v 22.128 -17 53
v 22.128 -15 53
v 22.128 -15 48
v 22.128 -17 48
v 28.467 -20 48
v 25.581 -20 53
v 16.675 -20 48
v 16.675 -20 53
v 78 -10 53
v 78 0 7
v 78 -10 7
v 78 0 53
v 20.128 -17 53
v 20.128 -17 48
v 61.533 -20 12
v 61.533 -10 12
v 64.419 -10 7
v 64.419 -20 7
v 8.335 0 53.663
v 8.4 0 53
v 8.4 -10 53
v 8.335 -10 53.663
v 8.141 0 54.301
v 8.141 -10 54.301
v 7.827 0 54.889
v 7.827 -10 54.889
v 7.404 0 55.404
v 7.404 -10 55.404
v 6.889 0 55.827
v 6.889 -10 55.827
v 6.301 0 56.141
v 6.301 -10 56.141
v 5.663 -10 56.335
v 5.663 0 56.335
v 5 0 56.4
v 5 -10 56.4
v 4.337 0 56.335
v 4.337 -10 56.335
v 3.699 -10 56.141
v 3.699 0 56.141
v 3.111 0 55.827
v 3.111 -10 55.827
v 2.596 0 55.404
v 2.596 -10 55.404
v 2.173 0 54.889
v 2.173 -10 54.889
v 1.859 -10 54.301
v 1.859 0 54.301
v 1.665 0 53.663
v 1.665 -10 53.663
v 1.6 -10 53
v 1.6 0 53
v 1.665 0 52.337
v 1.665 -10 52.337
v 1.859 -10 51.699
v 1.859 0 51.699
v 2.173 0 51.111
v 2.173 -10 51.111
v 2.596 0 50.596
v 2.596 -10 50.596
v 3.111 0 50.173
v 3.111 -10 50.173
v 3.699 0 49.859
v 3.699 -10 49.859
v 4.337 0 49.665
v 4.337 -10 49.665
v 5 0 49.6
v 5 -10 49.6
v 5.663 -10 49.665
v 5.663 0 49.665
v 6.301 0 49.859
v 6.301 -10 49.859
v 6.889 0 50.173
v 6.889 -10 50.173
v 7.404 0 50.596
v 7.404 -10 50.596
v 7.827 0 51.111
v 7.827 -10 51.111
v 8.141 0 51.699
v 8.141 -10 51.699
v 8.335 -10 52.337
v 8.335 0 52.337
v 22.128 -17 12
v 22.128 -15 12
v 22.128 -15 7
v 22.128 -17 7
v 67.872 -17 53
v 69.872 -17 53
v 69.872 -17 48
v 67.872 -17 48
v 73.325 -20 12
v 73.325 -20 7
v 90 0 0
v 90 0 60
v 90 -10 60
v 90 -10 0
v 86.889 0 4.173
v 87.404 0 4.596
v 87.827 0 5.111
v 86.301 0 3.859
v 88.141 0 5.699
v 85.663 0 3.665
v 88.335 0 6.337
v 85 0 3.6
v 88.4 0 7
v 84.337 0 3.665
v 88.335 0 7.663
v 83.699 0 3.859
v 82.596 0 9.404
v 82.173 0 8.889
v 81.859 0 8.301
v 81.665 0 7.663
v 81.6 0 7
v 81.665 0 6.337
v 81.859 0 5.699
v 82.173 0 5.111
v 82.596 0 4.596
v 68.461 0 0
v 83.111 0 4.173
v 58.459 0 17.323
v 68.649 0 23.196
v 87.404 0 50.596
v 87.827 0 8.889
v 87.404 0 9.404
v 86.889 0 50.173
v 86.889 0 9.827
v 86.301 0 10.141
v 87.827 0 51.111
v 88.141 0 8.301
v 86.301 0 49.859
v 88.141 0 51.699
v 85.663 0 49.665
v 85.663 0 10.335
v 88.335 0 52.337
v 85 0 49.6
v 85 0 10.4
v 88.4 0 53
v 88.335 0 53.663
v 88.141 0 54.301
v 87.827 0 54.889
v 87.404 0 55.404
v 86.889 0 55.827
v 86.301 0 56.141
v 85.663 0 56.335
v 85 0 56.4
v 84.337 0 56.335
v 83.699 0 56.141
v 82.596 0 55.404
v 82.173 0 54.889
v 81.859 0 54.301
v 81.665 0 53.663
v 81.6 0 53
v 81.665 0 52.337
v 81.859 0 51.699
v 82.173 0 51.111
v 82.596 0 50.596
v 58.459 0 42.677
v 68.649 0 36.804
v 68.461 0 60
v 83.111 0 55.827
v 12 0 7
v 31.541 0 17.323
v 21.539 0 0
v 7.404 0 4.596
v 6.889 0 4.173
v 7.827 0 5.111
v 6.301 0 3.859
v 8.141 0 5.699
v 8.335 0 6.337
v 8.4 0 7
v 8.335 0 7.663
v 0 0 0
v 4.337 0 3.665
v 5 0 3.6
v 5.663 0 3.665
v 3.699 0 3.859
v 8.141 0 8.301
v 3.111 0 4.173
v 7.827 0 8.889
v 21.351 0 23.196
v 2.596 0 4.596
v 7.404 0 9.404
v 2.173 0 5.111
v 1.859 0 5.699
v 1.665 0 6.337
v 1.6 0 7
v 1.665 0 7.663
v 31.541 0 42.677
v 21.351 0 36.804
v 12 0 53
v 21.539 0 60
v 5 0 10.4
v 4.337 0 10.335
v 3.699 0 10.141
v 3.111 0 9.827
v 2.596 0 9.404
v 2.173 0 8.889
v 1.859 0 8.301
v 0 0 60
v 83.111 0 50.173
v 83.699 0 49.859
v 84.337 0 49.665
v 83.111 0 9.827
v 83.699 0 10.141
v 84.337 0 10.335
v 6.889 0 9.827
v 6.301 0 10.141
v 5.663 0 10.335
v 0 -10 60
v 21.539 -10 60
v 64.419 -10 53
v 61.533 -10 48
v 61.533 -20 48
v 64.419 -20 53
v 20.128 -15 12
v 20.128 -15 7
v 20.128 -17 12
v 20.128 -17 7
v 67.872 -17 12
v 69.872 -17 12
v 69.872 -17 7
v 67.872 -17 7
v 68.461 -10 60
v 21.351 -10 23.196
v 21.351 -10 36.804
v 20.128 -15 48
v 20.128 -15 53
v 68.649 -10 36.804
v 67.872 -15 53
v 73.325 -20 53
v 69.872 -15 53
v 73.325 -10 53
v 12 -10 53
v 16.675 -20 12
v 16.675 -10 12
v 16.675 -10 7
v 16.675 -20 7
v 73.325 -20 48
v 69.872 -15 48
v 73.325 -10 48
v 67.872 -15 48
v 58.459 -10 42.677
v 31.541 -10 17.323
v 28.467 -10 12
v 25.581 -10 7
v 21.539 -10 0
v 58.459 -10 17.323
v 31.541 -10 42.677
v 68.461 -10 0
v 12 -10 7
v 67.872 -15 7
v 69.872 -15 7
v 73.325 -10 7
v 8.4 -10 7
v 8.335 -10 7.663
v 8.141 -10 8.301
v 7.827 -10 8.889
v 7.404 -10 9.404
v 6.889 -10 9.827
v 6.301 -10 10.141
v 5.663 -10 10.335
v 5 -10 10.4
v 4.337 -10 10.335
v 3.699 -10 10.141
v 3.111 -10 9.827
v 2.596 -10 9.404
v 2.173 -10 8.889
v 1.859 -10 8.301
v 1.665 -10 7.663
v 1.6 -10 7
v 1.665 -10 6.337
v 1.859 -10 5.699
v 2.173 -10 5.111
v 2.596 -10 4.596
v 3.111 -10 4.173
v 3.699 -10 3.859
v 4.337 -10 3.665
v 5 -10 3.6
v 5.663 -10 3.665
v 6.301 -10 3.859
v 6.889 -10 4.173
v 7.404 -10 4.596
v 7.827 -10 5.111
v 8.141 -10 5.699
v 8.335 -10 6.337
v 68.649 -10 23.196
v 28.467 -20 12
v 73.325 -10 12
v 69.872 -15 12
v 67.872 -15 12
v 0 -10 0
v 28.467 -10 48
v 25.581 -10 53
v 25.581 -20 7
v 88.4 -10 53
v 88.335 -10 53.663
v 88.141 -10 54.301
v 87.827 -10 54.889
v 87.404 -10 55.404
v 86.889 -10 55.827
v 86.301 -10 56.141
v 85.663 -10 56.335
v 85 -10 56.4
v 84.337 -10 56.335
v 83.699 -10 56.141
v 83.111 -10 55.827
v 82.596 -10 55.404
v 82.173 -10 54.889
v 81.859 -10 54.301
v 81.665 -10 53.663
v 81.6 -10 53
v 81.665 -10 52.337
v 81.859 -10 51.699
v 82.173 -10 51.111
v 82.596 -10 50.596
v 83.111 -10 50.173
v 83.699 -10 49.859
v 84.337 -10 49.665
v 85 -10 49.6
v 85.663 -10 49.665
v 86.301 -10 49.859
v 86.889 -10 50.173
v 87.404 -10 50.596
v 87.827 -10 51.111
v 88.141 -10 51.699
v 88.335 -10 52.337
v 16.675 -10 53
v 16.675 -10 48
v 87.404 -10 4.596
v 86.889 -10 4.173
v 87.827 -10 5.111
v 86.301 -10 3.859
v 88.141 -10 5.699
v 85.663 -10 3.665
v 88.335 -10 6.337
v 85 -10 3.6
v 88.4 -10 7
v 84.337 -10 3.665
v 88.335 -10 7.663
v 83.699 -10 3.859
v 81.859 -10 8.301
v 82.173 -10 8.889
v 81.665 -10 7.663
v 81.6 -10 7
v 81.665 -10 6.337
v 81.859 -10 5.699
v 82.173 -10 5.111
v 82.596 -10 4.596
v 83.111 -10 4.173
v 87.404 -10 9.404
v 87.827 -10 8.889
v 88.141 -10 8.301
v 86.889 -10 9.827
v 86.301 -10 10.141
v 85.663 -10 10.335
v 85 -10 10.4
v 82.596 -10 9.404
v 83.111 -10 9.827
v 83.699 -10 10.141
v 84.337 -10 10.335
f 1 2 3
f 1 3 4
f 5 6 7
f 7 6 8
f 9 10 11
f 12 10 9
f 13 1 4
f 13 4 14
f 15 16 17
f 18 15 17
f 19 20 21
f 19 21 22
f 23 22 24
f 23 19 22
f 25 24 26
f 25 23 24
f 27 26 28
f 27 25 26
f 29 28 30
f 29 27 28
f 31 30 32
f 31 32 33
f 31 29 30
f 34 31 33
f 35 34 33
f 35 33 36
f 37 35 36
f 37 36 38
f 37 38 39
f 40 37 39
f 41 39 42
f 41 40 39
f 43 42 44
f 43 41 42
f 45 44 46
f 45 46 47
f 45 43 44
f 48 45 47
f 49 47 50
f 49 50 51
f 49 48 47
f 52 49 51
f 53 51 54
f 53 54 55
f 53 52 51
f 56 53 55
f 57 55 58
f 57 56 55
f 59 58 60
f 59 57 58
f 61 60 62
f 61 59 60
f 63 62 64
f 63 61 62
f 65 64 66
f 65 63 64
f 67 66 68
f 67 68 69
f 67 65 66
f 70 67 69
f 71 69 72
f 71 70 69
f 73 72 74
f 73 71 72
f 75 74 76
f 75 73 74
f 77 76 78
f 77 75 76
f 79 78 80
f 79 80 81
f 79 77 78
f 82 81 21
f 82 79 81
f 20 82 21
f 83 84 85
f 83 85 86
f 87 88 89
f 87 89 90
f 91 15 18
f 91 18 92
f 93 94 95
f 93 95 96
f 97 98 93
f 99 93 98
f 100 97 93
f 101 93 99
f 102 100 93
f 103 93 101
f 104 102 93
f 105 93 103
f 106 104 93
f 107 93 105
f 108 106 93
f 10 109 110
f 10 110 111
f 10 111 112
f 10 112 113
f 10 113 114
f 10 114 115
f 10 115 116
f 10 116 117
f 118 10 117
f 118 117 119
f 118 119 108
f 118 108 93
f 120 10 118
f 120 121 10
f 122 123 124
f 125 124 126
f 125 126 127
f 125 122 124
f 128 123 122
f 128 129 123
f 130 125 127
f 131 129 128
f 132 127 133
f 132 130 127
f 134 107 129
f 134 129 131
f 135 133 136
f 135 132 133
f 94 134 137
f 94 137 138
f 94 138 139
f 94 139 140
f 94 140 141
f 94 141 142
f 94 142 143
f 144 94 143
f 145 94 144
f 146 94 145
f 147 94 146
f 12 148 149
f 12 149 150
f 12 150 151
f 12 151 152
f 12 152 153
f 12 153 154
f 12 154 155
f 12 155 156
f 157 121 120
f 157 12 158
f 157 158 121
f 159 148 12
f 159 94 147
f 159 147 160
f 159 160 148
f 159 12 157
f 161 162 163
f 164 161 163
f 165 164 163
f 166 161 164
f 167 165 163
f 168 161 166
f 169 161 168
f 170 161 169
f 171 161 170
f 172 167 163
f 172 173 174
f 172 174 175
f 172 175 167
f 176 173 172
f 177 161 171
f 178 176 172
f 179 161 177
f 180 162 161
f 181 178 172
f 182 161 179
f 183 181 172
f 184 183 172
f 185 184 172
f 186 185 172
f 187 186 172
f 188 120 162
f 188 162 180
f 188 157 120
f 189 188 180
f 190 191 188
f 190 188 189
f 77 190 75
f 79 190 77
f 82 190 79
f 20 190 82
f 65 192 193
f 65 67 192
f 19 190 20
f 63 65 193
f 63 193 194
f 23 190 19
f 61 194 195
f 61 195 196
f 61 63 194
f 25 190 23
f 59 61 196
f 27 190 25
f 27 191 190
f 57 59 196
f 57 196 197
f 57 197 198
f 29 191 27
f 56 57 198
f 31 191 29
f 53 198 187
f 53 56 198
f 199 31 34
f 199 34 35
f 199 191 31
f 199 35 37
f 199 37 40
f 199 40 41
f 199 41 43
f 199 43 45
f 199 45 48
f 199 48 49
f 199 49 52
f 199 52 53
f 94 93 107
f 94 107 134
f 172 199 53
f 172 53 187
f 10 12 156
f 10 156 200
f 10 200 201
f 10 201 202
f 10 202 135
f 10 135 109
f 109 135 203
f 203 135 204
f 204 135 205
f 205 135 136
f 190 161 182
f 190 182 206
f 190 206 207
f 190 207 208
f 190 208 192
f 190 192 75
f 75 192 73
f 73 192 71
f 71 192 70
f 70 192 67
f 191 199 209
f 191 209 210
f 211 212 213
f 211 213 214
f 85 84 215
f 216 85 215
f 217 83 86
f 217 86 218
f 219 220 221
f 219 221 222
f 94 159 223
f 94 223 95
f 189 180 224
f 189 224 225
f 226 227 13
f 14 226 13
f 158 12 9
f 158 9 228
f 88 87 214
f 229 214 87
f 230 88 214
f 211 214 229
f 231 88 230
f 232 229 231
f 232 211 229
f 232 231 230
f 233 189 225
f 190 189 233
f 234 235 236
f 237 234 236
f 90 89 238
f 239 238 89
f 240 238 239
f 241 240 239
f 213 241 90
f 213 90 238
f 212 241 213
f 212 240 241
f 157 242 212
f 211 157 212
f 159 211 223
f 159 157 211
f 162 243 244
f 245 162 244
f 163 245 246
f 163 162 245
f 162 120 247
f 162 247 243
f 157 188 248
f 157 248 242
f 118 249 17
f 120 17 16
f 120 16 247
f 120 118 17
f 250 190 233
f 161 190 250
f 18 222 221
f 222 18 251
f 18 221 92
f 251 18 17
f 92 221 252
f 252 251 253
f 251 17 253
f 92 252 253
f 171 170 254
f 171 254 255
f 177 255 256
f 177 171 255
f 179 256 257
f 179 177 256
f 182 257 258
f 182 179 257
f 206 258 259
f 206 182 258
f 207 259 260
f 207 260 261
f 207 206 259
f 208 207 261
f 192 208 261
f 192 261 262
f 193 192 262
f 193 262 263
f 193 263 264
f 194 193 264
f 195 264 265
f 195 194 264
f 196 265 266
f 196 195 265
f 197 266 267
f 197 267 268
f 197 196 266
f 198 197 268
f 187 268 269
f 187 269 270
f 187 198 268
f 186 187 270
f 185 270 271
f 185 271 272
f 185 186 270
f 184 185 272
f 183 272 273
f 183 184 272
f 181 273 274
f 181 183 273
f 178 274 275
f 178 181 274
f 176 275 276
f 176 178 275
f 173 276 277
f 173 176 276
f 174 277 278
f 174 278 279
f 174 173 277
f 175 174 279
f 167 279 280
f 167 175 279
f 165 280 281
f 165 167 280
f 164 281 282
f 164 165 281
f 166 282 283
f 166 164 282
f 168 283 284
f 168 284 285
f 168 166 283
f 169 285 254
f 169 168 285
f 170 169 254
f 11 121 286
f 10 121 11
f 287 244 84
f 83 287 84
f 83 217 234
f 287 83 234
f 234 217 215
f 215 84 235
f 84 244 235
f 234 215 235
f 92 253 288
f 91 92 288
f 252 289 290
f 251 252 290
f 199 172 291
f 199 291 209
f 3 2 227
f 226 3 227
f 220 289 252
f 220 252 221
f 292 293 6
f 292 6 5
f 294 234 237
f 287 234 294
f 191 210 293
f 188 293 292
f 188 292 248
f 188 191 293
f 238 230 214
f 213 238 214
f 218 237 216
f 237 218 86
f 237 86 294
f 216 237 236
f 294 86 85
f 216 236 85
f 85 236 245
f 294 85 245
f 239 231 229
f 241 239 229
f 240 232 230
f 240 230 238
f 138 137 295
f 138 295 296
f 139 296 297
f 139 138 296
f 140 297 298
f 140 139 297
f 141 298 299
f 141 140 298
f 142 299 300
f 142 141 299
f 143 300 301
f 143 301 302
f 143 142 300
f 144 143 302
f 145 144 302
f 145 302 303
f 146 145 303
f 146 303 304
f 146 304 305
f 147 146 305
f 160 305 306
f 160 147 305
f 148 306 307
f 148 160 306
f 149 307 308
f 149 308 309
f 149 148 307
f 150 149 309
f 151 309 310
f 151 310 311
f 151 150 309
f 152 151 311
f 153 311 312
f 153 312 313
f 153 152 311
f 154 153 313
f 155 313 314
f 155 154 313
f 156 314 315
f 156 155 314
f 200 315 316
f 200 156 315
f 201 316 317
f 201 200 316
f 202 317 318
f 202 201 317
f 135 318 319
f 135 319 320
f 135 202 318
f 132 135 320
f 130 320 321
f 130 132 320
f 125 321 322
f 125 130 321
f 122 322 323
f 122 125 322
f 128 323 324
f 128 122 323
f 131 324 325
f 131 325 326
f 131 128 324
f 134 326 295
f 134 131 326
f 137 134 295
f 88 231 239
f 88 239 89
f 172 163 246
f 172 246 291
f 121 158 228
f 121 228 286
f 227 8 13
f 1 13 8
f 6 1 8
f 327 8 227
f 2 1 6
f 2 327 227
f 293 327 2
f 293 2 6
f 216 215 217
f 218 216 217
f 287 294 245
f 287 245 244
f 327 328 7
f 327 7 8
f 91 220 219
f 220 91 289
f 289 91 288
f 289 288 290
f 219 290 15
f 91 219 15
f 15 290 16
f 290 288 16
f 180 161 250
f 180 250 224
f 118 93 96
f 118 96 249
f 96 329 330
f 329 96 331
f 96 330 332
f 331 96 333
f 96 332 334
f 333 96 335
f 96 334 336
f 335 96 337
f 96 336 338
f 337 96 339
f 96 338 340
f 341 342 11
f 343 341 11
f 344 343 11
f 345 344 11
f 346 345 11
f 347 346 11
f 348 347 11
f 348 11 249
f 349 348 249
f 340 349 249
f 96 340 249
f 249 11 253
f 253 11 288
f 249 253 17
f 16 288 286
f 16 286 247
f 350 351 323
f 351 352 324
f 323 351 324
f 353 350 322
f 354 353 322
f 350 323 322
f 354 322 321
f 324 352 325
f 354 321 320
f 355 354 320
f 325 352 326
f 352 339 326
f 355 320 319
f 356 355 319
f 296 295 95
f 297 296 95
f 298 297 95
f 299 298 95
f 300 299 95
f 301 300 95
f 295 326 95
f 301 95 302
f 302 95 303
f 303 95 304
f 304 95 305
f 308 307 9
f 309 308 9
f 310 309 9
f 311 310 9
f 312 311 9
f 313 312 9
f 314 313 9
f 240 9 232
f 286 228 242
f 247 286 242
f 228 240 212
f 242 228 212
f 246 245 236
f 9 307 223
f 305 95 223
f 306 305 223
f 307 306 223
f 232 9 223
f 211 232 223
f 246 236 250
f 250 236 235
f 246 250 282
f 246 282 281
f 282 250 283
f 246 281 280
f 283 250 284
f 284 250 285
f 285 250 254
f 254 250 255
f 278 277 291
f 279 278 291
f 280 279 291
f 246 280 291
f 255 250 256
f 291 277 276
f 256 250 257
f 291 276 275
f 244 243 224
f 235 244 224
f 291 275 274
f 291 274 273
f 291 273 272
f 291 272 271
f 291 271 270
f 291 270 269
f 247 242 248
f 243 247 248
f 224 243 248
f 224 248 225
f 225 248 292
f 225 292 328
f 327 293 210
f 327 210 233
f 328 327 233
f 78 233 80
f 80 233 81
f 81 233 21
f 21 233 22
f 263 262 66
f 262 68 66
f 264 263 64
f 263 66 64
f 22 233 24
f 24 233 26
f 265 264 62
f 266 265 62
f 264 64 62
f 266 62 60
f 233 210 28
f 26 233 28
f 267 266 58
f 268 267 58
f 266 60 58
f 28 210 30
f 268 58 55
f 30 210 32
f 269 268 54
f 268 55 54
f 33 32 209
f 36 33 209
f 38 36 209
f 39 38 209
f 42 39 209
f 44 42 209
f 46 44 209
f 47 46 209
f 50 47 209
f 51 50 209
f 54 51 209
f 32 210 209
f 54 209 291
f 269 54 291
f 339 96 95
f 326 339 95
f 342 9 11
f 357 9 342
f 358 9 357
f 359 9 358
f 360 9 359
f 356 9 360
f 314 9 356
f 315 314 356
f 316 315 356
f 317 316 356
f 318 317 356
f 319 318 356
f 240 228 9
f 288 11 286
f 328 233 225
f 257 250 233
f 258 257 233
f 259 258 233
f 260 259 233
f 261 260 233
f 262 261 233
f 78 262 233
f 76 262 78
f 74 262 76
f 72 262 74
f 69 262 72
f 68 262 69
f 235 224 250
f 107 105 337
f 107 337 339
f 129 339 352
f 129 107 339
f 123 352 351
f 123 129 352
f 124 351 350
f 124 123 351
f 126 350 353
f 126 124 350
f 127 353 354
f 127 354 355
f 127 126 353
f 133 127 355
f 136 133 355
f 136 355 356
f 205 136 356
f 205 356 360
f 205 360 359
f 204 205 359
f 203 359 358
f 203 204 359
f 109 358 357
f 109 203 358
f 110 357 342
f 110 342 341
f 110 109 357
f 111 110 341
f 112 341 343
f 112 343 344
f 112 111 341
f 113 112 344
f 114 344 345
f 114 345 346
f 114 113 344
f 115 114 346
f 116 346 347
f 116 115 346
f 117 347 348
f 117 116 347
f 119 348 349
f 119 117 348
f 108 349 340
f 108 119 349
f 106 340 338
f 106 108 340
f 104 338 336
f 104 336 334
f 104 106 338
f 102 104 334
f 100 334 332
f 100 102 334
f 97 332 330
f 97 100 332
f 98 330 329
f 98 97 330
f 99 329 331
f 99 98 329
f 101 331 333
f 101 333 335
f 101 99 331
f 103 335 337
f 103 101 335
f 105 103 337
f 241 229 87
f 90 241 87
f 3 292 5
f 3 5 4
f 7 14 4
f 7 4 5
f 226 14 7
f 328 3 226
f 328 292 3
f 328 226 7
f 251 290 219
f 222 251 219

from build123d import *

# Parameters (mm, degrees)
SKETCH003_R  = 3.4
PAD001_DEPTH = 10
PAD002_DEPTH = 10
SKETCH005_W  = 2
SKETCH005_H  = 2
POCKET_DEPTH = 53.001


with BuildPart() as part:
    # Sketch003 → Pad001 (new body)
    with BuildSketch(Plane.XZ):
        Polygon((0, 60), (21.539201, 60), (31.540737, 42.676832), (58.459263, 42.676832), (68.460799, 60), (90, 60), (90, 0), (68.460799, 0), (58.459263, 17.323168), (31.540737, 17.323168), (21.539201, 0), (0, 0), align=None)
        with Locations((5, 53)):
            Circle(SKETCH003_R, mode=Mode.SUBTRACT)
        with Locations((5, 7)):
            Circle(SKETCH003_R, mode=Mode.SUBTRACT)
        with Locations((85, 7)):
            Circle(SKETCH003_R, mode=Mode.SUBTRACT)
        with Locations((85, 53)):
            Circle(SKETCH003_R, mode=Mode.SUBTRACT)
        Polygon((78, 53), (68.649322, 36.80415), (68.649322, 23.19585), (78, 7), align=None, mode=Mode.SUBTRACT)
        Polygon((12, 53), (12, 7), (21.350678, 23.19585), (21.350678, 36.80415), align=None, mode=Mode.SUBTRACT)
    extrude(amount=PAD001_DEPTH)

    # Sketch004 (on Face26 of Pad001) → Pad002 (join)
    with BuildSketch(Plane.XZ.offset(10)):
        Polygon((16.675339, 53), (25.580653, 53), (28.467405, 48), (16.675339, 48), align=None)
        Polygon((64.419347, 53), (73.324661, 53), (73.324661, 48), (61.532595, 48), align=None)
        Polygon((16.675339, 12), (16.675339, 7), (25.580653, 7), (28.467405, 12), align=None)
        Polygon((73.324661, 12), (61.532595, 12), (64.419347, 7), (73.324661, 7), align=None)
    extrude(amount=PAD002_DEPTH)

    # Sketch005 (on Face39 of Pad002) → Pocket (cut, through all)
    with BuildSketch(Plane(origin=(0, 0, 53), x_dir=(-1, 0, 0), z_dir=(0, 0, 1))):
        with Locations((-21.127996, 16)):
            Rectangle(SKETCH005_W, SKETCH005_H)
        with Locations((-68.872004, 16)):
            Rectangle(SKETCH005_W, SKETCH005_H)
    extrude(amount=-POCKET_DEPTH, mode=Mode.SUBTRACT)


solid = part.part
